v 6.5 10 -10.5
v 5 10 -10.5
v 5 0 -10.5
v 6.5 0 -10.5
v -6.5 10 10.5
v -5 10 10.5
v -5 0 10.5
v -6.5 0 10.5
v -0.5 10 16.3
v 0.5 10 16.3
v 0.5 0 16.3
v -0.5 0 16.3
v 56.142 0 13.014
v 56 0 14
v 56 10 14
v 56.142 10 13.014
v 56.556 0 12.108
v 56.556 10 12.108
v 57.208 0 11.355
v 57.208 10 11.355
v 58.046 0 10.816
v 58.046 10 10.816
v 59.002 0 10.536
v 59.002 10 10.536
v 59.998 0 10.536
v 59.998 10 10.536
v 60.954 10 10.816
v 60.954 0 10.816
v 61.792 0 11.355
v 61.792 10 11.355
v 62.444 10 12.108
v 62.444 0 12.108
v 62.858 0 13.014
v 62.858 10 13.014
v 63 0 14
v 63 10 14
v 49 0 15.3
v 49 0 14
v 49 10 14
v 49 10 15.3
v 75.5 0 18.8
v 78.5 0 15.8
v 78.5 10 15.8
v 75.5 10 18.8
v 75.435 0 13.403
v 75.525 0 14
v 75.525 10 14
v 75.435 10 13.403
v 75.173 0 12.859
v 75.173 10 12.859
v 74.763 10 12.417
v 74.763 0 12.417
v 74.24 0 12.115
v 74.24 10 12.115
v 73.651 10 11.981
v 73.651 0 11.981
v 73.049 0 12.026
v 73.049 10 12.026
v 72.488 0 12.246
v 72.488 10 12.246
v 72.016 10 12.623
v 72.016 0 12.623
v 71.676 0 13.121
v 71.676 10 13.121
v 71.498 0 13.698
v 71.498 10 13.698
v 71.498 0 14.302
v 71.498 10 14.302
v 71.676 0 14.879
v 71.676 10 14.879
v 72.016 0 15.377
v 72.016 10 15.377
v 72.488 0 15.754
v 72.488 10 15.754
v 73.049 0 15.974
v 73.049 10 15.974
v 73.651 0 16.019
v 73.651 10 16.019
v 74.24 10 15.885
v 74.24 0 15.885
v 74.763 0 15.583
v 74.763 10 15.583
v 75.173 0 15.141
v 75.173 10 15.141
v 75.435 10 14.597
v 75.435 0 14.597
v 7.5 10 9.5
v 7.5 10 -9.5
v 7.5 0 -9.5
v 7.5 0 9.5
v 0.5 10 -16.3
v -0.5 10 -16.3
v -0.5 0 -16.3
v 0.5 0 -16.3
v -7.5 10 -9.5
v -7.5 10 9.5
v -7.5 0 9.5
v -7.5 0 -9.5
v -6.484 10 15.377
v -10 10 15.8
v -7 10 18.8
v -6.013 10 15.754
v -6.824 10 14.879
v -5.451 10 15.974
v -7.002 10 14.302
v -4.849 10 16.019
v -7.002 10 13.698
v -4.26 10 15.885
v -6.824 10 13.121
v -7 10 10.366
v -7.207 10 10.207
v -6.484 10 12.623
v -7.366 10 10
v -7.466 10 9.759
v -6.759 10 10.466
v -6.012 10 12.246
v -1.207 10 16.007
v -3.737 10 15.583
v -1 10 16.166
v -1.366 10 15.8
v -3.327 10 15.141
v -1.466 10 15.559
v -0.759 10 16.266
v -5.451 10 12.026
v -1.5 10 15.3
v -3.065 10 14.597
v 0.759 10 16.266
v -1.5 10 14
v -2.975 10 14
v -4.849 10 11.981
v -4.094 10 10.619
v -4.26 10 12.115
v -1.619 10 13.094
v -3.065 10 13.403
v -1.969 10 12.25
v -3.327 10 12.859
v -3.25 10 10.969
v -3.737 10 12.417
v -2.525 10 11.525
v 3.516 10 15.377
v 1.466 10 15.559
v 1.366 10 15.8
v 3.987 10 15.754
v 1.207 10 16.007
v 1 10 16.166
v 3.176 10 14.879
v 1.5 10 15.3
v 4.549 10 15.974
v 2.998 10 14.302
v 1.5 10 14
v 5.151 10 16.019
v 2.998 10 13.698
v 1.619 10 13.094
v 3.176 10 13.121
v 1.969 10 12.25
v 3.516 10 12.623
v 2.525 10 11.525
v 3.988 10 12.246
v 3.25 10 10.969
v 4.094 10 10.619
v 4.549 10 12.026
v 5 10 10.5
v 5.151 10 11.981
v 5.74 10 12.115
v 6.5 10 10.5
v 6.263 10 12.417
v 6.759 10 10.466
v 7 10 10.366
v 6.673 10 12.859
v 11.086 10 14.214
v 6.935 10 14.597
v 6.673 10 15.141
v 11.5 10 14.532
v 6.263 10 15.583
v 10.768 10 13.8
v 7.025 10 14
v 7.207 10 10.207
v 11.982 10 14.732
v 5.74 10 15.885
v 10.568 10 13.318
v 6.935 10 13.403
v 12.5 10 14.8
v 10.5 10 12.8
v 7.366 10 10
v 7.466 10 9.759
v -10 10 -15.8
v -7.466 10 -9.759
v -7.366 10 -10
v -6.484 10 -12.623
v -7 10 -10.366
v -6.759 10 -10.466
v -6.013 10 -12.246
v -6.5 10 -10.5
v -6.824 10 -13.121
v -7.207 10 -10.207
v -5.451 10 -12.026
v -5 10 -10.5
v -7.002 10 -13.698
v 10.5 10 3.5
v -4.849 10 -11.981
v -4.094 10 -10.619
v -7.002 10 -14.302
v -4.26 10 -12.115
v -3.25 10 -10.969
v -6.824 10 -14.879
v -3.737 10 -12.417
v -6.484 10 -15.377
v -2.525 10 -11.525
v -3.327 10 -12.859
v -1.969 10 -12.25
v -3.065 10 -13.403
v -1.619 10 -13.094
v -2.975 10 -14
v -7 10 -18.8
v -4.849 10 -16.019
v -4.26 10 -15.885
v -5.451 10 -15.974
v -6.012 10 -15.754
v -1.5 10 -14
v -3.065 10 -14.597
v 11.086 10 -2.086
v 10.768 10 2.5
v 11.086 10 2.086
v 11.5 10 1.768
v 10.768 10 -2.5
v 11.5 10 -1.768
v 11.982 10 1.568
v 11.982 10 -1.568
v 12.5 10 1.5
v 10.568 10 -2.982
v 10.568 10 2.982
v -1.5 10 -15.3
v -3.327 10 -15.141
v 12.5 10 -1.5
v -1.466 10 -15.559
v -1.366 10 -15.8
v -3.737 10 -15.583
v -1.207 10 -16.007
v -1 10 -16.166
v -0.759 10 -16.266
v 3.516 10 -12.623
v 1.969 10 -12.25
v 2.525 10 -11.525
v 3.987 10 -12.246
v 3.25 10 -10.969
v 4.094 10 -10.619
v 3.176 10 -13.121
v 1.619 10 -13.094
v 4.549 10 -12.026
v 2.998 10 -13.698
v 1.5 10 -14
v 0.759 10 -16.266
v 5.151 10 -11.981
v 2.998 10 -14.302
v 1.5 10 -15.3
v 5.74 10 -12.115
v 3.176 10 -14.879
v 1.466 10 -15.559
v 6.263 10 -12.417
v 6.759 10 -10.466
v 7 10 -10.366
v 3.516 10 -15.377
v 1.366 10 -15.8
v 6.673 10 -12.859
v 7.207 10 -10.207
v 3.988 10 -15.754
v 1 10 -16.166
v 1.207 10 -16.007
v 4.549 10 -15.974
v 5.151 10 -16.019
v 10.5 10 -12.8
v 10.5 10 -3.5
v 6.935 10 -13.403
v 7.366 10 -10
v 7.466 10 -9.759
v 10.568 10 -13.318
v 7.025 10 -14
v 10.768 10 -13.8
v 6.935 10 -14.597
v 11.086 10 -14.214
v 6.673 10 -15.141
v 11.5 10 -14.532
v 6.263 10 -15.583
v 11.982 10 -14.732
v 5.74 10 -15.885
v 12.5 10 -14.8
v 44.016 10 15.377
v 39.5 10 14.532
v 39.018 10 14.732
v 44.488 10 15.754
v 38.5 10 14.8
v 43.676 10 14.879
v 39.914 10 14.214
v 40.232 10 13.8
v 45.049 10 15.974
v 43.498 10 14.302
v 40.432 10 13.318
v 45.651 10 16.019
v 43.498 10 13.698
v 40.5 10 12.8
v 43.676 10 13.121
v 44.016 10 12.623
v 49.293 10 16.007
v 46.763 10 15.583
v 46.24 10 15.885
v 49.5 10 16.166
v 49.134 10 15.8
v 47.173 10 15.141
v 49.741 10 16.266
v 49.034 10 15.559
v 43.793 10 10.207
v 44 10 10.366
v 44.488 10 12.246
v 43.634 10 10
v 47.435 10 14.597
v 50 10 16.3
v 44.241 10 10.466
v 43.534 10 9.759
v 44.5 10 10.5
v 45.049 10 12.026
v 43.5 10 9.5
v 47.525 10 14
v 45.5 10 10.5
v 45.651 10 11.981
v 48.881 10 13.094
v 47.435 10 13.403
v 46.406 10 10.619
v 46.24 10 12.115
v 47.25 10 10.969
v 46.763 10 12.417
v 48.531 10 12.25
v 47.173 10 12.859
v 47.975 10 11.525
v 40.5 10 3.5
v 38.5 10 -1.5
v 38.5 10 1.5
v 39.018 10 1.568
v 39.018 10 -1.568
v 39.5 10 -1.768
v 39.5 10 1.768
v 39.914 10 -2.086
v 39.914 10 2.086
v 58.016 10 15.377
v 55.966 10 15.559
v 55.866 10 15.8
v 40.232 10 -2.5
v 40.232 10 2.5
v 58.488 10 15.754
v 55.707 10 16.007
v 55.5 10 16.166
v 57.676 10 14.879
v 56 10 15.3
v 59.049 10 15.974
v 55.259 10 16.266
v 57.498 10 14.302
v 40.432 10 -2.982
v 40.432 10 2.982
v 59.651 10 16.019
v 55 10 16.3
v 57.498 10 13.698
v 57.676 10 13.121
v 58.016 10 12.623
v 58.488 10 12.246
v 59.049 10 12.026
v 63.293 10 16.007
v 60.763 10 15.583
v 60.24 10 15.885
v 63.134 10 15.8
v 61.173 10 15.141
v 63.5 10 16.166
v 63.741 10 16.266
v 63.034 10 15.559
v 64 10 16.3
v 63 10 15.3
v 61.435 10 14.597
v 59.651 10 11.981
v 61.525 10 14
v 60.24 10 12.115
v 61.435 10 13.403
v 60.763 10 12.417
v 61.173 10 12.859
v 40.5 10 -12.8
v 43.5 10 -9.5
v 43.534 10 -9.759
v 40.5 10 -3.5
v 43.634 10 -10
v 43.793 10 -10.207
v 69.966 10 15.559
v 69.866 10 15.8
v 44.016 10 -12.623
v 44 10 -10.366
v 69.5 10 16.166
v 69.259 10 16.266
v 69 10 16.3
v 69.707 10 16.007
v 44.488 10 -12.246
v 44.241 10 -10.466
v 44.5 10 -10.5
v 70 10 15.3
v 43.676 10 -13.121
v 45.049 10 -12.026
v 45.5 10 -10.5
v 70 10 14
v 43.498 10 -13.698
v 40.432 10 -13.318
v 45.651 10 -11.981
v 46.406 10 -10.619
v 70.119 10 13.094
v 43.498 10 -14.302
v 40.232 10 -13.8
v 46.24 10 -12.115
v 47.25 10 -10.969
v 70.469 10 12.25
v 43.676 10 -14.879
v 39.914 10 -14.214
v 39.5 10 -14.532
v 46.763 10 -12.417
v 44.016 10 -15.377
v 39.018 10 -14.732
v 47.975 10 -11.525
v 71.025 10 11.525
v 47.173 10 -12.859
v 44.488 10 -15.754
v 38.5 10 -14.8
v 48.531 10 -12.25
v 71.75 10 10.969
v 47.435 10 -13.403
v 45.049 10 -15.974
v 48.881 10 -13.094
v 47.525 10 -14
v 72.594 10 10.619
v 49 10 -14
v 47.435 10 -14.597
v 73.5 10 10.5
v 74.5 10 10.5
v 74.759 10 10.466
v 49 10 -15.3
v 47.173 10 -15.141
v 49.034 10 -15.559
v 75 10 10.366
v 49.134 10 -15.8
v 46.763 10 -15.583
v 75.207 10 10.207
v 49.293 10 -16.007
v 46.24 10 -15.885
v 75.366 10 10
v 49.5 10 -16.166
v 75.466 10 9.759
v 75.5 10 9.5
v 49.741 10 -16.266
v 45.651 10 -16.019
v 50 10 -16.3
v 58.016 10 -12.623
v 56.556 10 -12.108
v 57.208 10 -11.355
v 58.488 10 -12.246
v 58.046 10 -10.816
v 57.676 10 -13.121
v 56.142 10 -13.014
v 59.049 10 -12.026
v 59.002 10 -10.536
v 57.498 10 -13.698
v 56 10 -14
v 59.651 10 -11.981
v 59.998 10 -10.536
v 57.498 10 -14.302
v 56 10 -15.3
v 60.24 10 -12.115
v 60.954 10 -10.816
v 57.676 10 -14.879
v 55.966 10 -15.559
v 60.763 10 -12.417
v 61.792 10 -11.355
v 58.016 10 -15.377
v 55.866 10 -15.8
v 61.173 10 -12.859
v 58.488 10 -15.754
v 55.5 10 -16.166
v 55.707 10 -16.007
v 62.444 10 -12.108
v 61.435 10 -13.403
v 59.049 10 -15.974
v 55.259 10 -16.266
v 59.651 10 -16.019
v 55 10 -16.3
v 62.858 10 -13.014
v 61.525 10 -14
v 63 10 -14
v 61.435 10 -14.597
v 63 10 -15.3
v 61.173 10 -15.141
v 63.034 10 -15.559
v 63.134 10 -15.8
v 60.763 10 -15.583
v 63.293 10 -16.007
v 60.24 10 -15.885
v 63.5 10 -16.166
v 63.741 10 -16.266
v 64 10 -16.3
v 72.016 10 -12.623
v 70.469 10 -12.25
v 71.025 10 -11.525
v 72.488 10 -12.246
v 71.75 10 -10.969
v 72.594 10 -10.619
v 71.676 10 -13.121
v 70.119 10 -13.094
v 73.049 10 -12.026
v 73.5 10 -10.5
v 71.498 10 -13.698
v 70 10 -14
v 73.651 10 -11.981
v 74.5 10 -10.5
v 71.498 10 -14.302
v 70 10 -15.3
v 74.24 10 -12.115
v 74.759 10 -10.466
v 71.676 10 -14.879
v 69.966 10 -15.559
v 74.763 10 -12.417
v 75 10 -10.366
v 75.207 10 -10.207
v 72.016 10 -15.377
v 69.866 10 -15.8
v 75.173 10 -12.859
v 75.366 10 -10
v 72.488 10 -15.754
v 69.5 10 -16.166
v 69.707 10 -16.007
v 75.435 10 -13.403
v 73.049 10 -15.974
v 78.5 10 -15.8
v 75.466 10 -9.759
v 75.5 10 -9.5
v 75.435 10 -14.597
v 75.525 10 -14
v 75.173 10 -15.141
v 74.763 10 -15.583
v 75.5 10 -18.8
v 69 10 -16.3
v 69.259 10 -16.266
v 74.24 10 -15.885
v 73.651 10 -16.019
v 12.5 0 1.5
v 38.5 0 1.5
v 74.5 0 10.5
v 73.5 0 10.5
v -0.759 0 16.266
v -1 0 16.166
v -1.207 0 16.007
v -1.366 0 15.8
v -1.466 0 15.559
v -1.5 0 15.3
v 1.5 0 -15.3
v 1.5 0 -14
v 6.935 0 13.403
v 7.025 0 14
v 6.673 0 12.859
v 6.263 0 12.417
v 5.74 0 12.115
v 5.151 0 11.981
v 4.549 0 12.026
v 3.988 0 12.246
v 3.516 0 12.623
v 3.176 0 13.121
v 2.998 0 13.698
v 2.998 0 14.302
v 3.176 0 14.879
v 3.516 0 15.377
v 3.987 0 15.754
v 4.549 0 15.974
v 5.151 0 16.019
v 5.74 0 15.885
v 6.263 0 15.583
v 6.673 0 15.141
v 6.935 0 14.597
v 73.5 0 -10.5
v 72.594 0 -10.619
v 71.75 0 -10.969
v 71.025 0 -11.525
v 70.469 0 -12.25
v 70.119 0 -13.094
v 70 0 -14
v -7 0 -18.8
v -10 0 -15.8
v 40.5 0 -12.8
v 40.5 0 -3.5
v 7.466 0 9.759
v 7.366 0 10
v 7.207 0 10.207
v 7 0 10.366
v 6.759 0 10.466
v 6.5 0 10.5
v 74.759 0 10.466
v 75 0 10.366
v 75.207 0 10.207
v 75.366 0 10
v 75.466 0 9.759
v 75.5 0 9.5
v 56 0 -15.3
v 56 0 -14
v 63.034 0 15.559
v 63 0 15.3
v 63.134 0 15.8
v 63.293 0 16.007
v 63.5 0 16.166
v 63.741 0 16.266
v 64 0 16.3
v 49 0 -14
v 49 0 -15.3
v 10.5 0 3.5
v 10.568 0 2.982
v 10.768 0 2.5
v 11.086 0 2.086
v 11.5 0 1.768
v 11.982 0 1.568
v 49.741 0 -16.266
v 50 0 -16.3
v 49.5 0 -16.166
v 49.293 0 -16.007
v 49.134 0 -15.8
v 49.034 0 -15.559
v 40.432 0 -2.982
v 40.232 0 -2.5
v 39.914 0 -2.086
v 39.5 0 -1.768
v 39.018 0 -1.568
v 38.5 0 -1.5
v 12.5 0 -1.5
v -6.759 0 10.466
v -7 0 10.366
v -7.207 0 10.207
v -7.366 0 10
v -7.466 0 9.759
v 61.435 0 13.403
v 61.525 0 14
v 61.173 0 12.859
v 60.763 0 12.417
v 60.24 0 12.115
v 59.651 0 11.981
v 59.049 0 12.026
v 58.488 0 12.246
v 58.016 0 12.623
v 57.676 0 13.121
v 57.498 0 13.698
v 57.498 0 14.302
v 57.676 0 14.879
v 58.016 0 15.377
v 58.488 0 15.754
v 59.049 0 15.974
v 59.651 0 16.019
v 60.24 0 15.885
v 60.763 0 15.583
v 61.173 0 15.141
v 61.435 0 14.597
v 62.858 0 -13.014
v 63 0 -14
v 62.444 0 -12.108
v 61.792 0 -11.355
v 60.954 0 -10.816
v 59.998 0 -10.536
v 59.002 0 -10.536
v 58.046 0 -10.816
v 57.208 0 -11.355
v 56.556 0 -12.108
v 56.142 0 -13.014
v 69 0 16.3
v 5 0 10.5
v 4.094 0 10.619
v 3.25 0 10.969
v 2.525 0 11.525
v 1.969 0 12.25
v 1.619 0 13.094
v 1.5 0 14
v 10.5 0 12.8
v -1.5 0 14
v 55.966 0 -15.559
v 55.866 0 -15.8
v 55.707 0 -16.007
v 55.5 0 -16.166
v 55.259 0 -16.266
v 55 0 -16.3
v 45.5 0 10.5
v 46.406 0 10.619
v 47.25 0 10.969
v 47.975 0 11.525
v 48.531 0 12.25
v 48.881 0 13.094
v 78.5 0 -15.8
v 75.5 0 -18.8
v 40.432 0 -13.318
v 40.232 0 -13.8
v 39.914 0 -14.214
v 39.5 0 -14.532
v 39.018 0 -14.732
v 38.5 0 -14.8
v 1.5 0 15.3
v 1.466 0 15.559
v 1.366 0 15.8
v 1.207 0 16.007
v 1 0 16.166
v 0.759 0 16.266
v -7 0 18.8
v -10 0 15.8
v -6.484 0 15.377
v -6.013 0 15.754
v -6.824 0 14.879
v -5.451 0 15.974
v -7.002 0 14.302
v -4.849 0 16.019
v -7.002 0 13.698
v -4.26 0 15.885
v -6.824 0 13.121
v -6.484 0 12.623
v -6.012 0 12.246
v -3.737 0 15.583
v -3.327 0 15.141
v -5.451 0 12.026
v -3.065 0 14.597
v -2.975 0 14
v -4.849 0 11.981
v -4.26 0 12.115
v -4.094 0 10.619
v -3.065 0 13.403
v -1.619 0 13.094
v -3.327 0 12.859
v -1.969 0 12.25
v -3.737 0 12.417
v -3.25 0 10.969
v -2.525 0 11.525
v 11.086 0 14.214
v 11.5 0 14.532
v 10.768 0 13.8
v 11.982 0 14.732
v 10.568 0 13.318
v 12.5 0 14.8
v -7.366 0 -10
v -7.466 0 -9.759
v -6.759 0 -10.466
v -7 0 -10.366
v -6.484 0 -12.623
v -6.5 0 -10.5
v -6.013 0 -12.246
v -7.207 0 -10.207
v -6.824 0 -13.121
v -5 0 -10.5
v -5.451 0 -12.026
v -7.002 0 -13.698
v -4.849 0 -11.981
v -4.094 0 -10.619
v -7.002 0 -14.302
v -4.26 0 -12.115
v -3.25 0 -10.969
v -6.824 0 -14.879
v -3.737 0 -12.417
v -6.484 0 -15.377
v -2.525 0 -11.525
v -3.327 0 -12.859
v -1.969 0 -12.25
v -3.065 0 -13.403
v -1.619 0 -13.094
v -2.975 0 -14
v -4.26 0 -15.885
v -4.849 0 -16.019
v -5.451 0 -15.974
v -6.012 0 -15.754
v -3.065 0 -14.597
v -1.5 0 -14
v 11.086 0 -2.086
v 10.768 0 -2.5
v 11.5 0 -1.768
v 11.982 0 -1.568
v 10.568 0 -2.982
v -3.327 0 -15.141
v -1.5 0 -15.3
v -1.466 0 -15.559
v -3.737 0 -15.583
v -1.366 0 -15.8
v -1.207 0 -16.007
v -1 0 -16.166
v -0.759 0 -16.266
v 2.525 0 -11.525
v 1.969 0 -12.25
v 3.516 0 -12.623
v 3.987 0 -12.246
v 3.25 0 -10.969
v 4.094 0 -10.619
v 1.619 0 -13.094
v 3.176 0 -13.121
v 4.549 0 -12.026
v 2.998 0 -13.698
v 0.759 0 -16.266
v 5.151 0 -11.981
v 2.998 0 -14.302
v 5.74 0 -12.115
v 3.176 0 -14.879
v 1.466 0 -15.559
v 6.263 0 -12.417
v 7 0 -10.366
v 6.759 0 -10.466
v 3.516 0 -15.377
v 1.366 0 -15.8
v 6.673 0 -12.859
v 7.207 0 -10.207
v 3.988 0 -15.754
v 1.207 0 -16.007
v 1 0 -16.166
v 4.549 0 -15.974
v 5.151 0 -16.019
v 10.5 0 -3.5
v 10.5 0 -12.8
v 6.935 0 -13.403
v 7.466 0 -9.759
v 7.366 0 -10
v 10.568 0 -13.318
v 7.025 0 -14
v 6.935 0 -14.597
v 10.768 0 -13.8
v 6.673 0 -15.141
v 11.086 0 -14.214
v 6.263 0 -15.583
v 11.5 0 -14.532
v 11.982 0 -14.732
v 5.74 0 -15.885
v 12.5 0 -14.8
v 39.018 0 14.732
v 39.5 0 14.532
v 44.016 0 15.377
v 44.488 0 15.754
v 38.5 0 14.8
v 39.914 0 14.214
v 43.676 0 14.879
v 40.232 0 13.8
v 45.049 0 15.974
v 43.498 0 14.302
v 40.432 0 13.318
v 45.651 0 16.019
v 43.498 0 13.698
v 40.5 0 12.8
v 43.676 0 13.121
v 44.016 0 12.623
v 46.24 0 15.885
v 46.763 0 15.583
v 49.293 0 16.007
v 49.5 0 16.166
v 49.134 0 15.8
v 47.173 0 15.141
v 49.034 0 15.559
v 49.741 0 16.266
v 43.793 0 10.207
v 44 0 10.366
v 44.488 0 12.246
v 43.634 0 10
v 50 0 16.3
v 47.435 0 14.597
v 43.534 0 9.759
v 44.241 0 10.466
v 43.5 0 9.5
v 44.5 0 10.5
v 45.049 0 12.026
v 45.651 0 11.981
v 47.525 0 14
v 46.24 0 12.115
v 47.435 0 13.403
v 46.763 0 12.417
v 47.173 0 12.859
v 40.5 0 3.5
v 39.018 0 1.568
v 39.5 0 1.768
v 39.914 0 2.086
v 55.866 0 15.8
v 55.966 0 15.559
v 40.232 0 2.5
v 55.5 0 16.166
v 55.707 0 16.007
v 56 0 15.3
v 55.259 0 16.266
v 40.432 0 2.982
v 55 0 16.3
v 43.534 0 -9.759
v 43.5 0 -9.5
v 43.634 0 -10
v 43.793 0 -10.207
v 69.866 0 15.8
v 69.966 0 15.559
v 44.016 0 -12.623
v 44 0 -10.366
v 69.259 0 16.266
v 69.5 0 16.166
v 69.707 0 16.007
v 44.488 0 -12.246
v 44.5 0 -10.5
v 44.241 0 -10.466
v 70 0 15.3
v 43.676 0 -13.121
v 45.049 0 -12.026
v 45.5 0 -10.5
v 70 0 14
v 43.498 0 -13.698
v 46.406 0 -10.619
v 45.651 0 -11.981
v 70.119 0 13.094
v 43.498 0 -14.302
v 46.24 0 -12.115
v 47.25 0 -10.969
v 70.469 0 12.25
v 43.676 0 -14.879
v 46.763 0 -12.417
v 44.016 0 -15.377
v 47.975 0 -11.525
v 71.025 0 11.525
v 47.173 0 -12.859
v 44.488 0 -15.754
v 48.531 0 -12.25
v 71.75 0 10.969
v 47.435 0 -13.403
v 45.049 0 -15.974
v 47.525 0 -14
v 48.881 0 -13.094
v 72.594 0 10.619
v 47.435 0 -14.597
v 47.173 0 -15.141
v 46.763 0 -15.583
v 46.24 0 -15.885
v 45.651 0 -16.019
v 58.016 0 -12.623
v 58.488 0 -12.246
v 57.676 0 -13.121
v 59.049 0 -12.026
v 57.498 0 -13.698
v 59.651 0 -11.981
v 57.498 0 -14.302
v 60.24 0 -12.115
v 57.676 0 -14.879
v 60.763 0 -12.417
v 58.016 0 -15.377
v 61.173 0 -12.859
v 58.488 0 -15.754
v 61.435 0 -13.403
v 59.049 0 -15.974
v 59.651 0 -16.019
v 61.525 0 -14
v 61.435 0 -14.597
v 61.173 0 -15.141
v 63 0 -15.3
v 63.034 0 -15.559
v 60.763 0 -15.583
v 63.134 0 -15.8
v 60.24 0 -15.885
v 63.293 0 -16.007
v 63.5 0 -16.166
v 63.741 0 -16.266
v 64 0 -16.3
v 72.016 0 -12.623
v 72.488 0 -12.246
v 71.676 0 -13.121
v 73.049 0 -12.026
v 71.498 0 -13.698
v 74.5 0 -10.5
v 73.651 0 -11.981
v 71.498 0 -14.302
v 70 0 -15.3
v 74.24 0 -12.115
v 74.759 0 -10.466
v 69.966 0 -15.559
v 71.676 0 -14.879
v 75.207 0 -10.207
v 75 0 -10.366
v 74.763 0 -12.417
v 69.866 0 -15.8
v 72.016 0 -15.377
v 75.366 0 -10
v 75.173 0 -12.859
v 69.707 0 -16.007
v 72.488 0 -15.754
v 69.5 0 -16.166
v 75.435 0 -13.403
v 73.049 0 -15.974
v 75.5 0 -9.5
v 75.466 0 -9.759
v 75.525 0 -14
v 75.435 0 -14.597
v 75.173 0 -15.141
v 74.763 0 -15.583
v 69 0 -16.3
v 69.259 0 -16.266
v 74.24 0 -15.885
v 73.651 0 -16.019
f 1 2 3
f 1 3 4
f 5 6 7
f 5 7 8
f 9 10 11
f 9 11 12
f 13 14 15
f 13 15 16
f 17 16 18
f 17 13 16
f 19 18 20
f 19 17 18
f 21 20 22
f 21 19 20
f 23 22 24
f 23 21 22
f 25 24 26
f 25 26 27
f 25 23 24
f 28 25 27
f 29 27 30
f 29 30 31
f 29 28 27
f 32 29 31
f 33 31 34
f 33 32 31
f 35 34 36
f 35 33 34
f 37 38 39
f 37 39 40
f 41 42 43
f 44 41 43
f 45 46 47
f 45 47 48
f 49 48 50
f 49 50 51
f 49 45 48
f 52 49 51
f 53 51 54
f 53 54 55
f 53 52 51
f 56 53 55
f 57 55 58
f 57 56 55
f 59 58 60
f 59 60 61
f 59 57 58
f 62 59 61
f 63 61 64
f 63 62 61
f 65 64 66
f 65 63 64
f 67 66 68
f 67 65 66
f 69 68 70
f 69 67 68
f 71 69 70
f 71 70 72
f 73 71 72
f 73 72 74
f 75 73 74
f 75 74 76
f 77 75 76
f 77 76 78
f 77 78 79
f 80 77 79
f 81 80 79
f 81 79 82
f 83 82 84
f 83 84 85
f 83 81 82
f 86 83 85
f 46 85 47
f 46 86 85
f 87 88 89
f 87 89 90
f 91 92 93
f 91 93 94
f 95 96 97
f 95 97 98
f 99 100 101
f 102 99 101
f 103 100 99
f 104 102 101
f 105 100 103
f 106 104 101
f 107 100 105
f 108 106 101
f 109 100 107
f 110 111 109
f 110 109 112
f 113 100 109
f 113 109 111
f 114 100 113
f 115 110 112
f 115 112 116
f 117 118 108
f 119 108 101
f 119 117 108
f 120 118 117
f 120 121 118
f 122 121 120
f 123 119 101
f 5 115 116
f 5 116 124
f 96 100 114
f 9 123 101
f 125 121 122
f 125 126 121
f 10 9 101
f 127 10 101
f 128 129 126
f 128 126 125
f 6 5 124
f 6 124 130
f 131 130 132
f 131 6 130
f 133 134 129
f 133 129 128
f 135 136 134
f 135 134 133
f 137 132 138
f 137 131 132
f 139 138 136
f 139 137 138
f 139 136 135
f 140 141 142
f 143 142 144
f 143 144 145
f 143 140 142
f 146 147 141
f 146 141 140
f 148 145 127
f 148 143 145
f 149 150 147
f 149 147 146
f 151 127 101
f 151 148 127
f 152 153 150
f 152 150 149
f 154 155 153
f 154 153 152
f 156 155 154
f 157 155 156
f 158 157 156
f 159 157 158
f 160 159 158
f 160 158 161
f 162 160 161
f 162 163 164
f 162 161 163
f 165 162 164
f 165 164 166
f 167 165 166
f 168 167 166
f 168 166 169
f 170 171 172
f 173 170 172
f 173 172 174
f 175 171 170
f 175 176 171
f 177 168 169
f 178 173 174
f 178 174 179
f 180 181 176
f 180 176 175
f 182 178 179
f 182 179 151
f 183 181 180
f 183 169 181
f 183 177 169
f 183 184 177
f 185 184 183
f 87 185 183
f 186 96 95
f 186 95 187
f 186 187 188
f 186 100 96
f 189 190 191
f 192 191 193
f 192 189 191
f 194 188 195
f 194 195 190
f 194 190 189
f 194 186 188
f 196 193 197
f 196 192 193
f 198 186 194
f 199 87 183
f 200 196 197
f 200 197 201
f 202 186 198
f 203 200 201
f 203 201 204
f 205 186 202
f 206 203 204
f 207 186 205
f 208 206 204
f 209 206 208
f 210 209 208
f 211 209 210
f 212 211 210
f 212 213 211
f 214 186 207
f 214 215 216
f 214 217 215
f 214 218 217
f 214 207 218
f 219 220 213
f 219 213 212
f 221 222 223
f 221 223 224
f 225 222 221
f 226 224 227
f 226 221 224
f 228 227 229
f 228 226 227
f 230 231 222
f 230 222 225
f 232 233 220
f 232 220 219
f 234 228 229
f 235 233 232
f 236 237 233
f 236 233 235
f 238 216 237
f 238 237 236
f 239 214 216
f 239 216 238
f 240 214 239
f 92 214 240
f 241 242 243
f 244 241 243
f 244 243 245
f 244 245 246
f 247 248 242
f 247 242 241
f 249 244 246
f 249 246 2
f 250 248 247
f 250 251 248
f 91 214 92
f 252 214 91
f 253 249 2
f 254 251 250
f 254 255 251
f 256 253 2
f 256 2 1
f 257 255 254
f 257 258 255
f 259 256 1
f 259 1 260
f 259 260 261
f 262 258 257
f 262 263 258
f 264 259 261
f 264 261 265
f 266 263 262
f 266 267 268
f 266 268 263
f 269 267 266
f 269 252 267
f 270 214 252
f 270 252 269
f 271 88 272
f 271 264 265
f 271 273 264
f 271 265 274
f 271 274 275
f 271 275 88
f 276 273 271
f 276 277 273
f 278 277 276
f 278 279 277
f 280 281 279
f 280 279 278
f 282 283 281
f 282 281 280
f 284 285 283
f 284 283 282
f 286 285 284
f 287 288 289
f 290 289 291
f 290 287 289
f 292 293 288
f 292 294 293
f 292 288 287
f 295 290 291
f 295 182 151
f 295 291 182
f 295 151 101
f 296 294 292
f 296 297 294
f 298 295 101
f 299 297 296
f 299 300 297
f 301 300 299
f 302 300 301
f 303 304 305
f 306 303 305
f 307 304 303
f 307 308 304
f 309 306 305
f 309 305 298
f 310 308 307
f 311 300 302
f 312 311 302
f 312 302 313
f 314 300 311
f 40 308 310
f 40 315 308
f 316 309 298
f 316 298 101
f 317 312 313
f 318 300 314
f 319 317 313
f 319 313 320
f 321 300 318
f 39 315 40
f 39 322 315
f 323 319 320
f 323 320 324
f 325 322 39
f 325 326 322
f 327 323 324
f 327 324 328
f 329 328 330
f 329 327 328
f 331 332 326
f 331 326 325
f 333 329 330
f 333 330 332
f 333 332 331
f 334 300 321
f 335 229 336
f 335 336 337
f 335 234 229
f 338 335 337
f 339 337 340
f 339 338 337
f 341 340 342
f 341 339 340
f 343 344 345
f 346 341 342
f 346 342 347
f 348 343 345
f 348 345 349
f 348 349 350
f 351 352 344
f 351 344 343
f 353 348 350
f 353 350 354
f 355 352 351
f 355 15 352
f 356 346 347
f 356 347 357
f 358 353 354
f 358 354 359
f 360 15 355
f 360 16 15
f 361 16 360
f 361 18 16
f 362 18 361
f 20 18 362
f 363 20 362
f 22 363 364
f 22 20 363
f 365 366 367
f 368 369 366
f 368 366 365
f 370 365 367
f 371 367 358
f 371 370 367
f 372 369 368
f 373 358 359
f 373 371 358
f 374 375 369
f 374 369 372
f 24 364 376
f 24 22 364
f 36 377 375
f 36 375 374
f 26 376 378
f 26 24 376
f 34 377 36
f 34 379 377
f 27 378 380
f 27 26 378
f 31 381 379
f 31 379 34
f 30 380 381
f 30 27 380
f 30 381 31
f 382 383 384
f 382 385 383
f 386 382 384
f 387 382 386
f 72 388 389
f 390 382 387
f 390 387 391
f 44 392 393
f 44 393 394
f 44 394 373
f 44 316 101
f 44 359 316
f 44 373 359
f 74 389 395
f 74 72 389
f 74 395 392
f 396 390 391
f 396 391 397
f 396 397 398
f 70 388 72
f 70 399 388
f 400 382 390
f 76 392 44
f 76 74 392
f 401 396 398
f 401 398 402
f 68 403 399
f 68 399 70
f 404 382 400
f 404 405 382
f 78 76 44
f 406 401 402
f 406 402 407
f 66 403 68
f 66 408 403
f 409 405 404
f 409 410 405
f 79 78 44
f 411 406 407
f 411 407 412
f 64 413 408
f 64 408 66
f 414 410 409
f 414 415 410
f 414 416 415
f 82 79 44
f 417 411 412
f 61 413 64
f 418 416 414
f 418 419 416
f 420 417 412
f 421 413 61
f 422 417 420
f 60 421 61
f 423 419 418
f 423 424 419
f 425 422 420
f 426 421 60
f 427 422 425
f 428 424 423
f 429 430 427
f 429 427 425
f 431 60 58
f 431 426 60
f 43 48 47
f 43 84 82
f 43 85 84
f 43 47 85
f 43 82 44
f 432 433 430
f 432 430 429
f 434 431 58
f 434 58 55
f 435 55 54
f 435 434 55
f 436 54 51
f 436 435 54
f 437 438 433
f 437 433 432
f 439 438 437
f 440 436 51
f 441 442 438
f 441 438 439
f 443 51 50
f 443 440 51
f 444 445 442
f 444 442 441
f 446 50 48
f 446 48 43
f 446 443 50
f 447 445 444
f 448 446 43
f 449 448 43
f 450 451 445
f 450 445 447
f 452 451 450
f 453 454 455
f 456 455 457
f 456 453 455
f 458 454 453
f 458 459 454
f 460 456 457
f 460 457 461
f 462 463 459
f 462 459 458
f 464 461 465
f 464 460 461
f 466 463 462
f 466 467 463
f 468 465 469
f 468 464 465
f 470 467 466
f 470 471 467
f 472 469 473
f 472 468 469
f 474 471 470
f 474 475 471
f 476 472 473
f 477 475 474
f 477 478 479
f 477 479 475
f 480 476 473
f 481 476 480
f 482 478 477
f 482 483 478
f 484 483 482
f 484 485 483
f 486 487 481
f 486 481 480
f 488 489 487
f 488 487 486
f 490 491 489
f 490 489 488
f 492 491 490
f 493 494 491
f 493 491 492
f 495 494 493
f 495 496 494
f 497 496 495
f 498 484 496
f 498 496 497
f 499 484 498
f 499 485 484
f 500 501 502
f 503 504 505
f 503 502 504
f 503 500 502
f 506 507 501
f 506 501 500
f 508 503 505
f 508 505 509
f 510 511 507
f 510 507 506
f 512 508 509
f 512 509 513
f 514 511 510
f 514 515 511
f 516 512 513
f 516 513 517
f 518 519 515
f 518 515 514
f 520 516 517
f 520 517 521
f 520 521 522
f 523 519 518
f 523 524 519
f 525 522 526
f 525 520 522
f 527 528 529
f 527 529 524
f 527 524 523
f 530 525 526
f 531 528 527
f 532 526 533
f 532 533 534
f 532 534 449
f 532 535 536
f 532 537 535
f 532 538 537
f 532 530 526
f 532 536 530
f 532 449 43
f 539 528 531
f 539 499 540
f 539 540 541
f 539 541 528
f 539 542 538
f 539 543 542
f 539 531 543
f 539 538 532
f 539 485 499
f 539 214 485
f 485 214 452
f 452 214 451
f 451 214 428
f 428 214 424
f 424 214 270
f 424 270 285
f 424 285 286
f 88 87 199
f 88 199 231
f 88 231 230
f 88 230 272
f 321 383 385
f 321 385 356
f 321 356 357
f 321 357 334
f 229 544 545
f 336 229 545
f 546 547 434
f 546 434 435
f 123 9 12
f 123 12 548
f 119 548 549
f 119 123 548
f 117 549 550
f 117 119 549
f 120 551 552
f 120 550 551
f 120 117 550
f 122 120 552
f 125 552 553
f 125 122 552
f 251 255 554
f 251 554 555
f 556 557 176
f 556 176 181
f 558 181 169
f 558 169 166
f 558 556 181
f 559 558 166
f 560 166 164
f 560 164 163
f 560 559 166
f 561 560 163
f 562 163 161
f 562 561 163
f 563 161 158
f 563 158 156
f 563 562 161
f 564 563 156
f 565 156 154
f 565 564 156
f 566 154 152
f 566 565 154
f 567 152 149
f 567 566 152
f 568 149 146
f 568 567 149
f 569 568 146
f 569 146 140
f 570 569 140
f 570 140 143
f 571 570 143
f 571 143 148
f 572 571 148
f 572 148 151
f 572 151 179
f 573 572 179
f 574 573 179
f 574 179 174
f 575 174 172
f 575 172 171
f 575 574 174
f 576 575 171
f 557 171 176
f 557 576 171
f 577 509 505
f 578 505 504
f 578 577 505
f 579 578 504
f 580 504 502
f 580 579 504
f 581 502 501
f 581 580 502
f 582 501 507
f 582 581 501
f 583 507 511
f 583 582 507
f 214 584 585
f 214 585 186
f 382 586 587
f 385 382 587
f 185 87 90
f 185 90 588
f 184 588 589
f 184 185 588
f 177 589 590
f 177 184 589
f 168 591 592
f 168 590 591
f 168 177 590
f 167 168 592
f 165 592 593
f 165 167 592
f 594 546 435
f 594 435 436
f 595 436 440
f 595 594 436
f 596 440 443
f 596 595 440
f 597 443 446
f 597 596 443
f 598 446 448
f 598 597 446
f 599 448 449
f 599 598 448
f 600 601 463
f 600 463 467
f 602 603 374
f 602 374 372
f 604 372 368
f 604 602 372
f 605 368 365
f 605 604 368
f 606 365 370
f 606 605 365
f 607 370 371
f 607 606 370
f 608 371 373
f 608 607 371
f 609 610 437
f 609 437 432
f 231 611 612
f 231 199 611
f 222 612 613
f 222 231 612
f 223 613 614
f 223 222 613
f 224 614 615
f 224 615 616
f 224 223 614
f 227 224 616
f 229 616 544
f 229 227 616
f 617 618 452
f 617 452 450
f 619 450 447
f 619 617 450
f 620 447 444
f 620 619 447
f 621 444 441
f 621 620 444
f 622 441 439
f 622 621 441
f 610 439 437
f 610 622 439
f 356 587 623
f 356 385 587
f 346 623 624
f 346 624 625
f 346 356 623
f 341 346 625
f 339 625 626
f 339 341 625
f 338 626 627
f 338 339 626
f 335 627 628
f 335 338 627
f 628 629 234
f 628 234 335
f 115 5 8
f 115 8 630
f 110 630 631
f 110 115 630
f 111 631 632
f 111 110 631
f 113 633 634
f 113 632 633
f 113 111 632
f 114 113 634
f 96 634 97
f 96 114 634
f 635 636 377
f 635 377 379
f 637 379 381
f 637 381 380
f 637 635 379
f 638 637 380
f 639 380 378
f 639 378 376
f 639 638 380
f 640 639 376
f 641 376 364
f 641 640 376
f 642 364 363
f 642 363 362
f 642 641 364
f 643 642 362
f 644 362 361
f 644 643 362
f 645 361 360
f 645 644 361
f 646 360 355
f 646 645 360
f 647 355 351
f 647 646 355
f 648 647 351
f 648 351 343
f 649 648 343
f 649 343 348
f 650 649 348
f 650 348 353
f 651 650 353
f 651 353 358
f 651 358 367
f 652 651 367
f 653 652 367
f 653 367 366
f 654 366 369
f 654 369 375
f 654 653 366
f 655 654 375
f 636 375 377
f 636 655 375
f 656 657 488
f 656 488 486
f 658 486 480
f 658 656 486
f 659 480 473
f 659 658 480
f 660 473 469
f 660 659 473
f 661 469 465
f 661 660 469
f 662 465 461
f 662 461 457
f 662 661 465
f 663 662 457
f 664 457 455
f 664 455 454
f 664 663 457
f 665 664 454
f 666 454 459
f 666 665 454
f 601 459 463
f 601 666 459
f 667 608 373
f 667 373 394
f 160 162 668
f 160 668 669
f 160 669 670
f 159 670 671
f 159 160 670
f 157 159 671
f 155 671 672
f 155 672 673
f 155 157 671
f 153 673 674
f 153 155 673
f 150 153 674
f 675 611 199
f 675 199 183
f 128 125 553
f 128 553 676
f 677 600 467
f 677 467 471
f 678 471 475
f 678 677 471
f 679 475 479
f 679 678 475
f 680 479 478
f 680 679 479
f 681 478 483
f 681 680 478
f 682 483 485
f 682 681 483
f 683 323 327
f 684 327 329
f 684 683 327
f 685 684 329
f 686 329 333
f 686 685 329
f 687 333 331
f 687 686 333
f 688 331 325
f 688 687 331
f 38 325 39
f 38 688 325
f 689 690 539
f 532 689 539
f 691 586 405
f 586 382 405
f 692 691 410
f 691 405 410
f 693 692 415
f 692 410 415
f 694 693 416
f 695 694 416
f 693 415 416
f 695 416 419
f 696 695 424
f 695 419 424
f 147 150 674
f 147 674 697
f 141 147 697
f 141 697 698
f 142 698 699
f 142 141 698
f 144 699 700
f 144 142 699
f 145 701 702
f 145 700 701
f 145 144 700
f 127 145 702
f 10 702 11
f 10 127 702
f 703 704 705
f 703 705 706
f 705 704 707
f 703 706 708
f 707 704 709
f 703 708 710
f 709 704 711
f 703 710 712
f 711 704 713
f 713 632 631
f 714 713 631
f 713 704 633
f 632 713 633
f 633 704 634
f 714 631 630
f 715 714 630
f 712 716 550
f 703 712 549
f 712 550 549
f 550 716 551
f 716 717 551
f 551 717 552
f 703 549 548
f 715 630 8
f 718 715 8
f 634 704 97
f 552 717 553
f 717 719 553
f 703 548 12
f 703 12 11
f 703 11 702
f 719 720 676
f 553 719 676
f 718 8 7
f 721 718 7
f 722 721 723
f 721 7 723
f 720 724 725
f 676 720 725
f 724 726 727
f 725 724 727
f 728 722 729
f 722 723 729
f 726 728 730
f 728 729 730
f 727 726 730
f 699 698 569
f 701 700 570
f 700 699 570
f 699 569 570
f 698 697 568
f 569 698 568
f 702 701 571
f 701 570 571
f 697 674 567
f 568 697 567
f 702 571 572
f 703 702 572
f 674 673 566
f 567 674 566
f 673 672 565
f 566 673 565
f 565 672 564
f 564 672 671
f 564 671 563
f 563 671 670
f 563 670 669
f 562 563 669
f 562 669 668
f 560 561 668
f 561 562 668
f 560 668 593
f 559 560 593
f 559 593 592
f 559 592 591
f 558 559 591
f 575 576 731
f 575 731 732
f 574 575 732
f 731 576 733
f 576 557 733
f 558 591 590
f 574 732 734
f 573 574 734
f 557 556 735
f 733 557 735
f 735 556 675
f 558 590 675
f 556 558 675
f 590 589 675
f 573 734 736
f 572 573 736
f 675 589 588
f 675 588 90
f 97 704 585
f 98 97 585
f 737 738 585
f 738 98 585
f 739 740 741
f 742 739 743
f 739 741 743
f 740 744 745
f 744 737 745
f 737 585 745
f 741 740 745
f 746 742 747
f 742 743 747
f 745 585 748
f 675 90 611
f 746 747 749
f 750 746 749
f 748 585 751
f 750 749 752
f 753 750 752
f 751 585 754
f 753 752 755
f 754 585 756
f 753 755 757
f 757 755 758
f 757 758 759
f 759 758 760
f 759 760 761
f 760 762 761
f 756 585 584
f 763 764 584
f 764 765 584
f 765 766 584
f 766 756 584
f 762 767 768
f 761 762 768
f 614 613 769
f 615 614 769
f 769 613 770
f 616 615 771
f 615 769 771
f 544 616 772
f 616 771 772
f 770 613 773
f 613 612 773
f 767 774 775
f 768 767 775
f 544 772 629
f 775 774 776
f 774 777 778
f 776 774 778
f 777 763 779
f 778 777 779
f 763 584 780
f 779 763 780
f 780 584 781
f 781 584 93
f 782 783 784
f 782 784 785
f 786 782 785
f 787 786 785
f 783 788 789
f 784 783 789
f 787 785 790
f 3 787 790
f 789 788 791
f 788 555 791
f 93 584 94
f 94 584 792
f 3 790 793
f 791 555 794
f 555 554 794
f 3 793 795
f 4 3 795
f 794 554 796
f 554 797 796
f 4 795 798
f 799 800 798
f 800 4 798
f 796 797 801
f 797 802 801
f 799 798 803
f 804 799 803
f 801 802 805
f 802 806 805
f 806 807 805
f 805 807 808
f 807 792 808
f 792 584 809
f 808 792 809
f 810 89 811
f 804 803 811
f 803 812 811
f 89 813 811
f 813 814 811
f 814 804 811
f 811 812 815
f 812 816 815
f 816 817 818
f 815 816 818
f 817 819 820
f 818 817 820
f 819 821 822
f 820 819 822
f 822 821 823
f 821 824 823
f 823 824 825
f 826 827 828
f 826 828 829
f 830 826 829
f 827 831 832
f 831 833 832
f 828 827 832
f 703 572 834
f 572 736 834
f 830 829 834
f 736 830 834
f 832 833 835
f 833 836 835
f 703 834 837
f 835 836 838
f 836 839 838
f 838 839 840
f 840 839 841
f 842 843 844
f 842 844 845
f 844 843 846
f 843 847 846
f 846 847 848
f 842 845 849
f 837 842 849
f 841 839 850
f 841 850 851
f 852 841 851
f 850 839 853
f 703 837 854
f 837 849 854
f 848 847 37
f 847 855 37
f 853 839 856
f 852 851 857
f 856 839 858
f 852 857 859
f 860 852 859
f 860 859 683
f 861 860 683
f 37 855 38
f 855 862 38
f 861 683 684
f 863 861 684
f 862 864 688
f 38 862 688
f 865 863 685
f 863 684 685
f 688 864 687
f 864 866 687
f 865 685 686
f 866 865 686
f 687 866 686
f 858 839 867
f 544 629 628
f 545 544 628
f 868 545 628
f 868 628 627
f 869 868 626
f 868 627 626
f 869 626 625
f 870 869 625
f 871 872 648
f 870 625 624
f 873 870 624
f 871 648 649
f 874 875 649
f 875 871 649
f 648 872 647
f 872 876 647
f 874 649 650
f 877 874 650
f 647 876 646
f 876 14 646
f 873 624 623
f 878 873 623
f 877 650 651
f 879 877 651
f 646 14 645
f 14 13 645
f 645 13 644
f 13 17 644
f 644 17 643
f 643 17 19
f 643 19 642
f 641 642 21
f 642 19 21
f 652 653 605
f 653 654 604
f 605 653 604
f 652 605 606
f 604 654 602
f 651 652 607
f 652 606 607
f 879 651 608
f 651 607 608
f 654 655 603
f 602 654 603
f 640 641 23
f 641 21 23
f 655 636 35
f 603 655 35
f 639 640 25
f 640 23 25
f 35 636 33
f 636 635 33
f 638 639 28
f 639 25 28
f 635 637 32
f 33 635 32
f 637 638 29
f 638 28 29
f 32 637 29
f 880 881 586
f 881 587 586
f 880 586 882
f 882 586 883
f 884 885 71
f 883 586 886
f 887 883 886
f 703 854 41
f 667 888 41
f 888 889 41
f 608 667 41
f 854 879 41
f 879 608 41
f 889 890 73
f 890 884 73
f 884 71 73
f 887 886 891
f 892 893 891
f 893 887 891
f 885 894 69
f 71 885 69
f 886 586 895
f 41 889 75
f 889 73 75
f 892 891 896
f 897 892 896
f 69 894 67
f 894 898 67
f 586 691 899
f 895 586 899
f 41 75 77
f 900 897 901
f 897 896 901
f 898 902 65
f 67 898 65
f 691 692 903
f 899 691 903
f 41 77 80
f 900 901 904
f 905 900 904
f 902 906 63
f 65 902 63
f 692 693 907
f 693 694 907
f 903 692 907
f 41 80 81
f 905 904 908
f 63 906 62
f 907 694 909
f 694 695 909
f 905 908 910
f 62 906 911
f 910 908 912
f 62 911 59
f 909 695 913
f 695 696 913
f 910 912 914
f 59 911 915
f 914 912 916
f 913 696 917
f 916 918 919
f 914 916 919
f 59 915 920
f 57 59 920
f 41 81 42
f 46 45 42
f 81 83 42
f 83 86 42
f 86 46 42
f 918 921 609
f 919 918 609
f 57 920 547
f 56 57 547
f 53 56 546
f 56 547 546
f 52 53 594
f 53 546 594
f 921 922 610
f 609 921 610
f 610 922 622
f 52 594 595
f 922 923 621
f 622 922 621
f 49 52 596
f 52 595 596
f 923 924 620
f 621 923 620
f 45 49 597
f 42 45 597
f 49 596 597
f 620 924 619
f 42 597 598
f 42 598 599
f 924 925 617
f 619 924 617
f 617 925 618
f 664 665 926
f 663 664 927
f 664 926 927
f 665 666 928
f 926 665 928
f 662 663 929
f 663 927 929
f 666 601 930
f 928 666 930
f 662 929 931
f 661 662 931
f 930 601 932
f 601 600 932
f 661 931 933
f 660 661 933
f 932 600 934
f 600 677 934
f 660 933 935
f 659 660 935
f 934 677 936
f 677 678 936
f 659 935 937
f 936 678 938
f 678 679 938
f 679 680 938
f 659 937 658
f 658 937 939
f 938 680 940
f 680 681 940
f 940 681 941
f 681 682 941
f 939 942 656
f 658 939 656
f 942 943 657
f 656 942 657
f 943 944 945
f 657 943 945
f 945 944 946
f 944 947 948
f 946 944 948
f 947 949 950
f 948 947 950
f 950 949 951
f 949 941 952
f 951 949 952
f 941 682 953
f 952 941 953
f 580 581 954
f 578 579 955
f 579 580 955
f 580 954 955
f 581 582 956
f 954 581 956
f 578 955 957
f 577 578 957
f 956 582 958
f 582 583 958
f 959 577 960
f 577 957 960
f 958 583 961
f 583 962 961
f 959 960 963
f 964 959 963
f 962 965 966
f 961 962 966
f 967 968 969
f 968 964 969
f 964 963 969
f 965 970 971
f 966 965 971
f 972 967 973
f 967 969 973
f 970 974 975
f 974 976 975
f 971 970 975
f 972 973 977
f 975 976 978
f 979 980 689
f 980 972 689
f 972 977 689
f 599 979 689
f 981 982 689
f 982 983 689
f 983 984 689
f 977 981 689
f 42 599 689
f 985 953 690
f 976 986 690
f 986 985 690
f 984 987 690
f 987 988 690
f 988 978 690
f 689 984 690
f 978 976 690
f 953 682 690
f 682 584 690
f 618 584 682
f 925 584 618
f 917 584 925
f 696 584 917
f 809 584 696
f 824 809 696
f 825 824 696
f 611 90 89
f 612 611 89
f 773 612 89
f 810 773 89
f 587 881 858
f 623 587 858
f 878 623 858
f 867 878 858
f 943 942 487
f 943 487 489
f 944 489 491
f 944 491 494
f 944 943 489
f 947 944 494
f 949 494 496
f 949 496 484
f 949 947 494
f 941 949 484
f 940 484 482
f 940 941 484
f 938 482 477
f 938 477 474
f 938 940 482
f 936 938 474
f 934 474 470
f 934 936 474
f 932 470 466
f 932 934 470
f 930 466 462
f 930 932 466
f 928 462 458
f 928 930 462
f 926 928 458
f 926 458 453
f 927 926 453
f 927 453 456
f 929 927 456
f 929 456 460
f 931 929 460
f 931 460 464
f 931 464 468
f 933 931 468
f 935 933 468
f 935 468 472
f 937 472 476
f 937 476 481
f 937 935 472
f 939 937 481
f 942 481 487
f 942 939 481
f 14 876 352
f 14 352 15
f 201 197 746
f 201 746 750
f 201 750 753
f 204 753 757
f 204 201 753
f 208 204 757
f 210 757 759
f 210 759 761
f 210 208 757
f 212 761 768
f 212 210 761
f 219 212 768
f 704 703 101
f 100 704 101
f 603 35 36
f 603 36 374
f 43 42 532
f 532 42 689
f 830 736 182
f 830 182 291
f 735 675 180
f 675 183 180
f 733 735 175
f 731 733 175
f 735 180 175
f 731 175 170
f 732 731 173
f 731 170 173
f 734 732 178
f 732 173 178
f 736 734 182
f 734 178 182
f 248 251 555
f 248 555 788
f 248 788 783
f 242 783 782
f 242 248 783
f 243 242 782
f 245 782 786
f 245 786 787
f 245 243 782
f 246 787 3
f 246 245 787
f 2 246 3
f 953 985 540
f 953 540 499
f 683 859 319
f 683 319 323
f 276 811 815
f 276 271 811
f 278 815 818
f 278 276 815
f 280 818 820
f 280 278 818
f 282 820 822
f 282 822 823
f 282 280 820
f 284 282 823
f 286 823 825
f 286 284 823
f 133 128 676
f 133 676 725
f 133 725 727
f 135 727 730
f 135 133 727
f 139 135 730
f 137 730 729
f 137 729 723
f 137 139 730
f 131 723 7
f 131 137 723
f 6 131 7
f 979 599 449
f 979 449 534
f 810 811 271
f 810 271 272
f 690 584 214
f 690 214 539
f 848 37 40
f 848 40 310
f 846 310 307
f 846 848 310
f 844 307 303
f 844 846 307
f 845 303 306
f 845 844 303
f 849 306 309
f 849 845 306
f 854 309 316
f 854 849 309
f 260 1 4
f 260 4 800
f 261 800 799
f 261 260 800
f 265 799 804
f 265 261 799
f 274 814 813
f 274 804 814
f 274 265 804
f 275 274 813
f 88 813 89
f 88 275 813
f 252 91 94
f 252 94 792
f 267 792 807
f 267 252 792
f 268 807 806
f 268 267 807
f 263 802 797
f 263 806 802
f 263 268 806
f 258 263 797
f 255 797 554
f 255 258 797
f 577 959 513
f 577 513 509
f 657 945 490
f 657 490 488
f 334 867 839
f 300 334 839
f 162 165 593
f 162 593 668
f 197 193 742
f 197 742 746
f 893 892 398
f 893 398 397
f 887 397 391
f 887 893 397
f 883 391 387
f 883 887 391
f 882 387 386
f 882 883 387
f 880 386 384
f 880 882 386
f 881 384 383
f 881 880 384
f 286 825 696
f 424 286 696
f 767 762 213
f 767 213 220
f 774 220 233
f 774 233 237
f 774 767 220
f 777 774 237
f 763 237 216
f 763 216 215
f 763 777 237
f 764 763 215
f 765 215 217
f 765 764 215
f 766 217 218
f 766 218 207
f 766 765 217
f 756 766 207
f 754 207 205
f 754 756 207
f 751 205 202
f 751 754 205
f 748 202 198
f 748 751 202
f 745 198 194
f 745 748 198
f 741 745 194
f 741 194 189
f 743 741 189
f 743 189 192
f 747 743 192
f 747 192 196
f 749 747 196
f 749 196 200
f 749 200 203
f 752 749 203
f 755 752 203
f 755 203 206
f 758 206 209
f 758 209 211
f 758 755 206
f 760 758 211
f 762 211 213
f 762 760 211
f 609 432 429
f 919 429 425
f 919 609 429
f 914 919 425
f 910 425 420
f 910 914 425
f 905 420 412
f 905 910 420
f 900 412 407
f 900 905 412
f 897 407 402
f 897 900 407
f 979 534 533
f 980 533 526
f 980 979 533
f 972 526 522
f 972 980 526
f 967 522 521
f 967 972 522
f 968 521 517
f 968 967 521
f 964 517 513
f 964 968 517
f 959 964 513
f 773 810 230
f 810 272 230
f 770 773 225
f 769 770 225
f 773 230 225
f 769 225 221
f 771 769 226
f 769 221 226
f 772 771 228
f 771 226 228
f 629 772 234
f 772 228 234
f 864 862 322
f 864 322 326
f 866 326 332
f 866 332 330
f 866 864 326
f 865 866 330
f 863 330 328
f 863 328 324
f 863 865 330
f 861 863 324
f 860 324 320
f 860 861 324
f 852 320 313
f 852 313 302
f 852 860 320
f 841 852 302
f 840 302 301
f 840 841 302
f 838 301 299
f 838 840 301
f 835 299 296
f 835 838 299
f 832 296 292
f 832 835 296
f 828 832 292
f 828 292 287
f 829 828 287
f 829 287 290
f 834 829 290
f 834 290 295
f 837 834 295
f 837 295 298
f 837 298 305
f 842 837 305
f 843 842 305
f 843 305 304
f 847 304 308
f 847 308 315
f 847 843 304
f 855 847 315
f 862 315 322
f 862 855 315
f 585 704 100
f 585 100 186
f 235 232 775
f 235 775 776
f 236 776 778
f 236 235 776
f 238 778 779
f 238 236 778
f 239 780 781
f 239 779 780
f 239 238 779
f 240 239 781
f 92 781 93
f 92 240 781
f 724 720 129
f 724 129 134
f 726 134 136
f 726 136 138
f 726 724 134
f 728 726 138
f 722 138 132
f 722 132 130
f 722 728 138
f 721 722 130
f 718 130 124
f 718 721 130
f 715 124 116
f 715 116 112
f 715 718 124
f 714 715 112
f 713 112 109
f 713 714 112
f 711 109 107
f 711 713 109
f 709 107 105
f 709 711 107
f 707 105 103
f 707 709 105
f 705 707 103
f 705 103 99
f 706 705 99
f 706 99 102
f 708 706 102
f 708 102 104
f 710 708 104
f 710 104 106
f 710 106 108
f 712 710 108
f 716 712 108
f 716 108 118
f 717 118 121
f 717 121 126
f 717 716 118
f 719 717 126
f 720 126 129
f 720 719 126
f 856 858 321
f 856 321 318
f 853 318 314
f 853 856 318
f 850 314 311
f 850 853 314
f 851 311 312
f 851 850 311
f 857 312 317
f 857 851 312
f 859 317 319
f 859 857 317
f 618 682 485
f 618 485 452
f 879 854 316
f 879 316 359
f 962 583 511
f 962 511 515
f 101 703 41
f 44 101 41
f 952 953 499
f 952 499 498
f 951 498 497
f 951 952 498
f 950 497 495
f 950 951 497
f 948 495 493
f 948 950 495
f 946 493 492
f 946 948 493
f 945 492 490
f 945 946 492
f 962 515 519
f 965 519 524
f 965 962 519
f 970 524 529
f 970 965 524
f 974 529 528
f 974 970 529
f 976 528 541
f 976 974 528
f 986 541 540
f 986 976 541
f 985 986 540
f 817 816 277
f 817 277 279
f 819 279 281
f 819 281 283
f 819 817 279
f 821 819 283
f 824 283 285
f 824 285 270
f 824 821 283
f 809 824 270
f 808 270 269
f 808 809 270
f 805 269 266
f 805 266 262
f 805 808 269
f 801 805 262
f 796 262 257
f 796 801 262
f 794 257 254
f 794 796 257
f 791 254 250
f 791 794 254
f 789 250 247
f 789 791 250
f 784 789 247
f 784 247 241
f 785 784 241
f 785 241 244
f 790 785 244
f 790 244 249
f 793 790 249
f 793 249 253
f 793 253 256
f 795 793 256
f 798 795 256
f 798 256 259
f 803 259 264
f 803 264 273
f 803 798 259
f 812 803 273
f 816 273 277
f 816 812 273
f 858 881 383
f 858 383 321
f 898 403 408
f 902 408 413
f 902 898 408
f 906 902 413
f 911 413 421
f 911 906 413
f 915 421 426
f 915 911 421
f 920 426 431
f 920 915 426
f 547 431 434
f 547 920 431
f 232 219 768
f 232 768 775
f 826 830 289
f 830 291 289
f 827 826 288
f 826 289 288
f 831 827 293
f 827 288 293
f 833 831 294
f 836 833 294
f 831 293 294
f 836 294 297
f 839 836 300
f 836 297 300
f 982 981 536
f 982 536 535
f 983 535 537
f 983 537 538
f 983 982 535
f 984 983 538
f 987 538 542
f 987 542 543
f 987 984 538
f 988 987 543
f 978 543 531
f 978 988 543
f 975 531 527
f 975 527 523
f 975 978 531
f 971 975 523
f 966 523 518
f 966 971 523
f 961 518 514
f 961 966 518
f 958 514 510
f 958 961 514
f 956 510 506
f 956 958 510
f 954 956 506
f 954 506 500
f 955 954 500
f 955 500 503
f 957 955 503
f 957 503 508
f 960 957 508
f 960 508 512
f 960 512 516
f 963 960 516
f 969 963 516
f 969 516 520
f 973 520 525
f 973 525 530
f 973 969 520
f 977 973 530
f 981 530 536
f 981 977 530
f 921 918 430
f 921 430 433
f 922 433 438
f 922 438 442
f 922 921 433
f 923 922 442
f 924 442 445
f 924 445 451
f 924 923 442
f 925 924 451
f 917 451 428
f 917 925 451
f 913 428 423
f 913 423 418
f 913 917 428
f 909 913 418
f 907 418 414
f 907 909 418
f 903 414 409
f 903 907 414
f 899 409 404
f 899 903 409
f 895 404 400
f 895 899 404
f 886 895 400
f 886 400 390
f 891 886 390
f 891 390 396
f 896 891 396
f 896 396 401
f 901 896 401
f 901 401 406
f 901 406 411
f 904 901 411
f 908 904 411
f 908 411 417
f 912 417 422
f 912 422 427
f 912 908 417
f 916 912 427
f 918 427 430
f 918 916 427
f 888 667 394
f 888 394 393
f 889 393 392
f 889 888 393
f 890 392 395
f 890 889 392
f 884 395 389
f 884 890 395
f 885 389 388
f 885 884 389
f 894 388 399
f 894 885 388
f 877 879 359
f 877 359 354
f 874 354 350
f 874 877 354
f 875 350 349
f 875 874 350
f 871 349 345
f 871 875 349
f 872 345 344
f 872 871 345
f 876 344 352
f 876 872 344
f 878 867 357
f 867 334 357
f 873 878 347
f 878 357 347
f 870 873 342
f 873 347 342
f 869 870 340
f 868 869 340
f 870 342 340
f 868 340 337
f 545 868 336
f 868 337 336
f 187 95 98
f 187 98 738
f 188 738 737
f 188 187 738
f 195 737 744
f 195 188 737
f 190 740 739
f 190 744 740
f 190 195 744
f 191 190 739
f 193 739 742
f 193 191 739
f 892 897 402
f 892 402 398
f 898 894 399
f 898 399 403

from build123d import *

# Parameters (mm, degrees)
SKETCH_1_W          = 88.5
SKETCH_1_H          = 37.6
SKETCH_1_R          = 2.025
EXTRUDE_1_DEPTH     = 10
CUT_EXTRUDE_1_DEPTH = 11
CUT_EXTRUDE_2_DEPTH = 11
SKETCH_4_W          = 30
SKETCH_4_H          = 29.6
CUT_EXTRUDE_3_DEPTH = 11
SKETCH_5_W          = 30
SKETCH_5_H          = 3
EXTRUDE_2_DEPTH     = 10
FILLET_1_R          = 2
CHAMFER_1_SIZE      = 3


with BuildPart() as part:
    # 草图1 → 凸台-拉伸1 (new body)
    with BuildSketch(Plane(origin=(0, 0, 0), x_dir=(1, 0, 0), z_dir=(0, 1, 0))):
        with Locations((34.25, 0)):
            Rectangle(SKETCH_1_W, SKETCH_1_H)
        with Locations((-5, 14)):
            Circle(SKETCH_1_R, mode=Mode.SUBTRACT)
        with Locations((5, 14)):
            Circle(SKETCH_1_R, mode=Mode.SUBTRACT)
        with Locations((5, -14)):
            Circle(SKETCH_1_R, mode=Mode.SUBTRACT)
        with Locations((-5, -14)):
            Circle(SKETCH_1_R, mode=Mode.SUBTRACT)
        with Locations((45.5, 14)):
            Circle(SKETCH_1_R, mode=Mode.SUBTRACT)
        with Locations((59.5, 14)):
            Circle(SKETCH_1_R, mode=Mode.SUBTRACT)
        with Locations((73.5, 14)):
            Circle(SKETCH_1_R, mode=Mode.SUBTRACT)
        with Locations((73.5, -14)):
            Circle(SKETCH_1_R, mode=Mode.SUBTRACT)
        with Locations((59.5, -14)):
            Circle(SKETCH_1_R, mode=Mode.SUBTRACT)
        with Locations((45.5, -14)):
            Circle(SKETCH_1_R, mode=Mode.SUBTRACT)
    extrude(amount=EXTRUDE_1_DEPTH)

    # 草图2 → 切除-拉伸1 (cut, through all)
    with BuildSketch(Plane(origin=(0, 10, 0), x_dir=(1, 0, 0), z_dir=(0, 1, 0))):
        with BuildLine():
            Line((-7.5, -9.5), (-7.5, 9.5))
            ThreePointArc((-7.5, 9.5), (-7.207106781, 10.207106781), (-6.5, 10.5))
            Line((-6.5, 10.5), (-5, 10.5))
            ThreePointArc((-5, 10.5), (-2.525126266, 11.525126266), (-1.5, 14))
            Line((-1.5, 14), (-1.5, 15.3))
            ThreePointArc((-1.5, 15.3), (-1.207106781, 16.007106781), (-0.5, 16.3))
            Line((-0.5, 16.3), (0.5, 16.3))
            ThreePointArc((0.5, 16.3), (1.207106781, 16.007106781), (1.5, 15.3))
            Line((1.5, 15.3), (1.5, 14))
            ThreePointArc((1.5, 14), (2.525126266, 11.525126266), (5, 10.5))
            Line((5, 10.5), (6.5, 10.5))
            ThreePointArc((6.5, 10.5), (7.207106781, 10.207106781), (7.5, 9.5))
            Line((7.5, 9.5), (7.5, -9.5))
            ThreePointArc((7.5, -9.5), (7.207106781, -10.207106781), (6.5, -10.5))
            Line((6.5, -10.5), (5, -10.5))
            ThreePointArc((5, -10.5), (2.525126266, -11.525126266), (1.5, -14))
            Line((1.5, -14), (1.5, -15.3))
            ThreePointArc((1.5, -15.3), (1.207106781, -16.007106781), (0.5, -16.3))
            Line((0.5, -16.3), (-0.5, -16.3))
            ThreePointArc((-0.5, -16.3), (-1.207106781, -16.007106781), (-1.5, -15.3))
            Line((-1.5, -15.3), (-1.5, -14))
            ThreePointArc((-1.5, -14), (-2.525126266, -11.525126266), (-5, -10.5))
            Line((-5, -10.5), (-6.5, -10.5))
            ThreePointArc((-6.5, -10.5), (-7.207106781, -10.207106781), (-7.5, -9.5))
        make_face()
    extrude(amount=-CUT_EXTRUDE_1_DEPTH, mode=Mode.SUBTRACT)

    # 草图3 → 切除-拉伸2 (cut, through all)
    with BuildSketch(Plane.XZ):
        with BuildLine():
            Line((43.5, -9.5), (43.5, 9.5))
            ThreePointArc((43.5, 9.5), (43.792893219, 10.207106781), (44.5, 10.5))
            Line((44.5, 10.5), (45.5, 10.5))
            ThreePointArc((45.5, 10.5), (47.974873734, 11.525126266), (49, 14))
            Line((49, 14), (49, 15.3))
            ThreePointArc((49, 15.3), (49.292893219, 16.007106781), (50, 16.3))
            Line((50, 16.3), (55, 16.3))
            ThreePointArc((55, 16.3), (55.707106781, 16.007106781), (56, 15.3))
            Line((56, 15.3), (56, 14))
            ThreePointArc((56, 14), (59.5, 10.5), (63, 14))
            Line((63, 14), (63, 15.3))
            ThreePointArc((63, 15.3), (63.292893219, 16.007106781), (64, 16.3))
            Line((64, 16.3), (69, 16.3))
            ThreePointArc((69, 16.3), (69.707106781, 16.007106781), (70, 15.3))
            Line((70, 15.3), (70, 14))
            ThreePointArc((70, 14), (71.025126266, 11.525126266), (73.5, 10.5))
            Line((73.5, 10.5), (74.5, 10.5))
            ThreePointArc((74.5, 10.5), (75.207106781, 10.207106781), (75.5, 9.5))
            Line((75.5, 9.5), (75.5, -9.5))
            ThreePointArc((75.5, -9.5), (75.207106781, -10.207106781), (74.5, -10.5))
            Line((74.5, -10.5), (73.5, -10.5))
            ThreePointArc((73.5, -10.5), (71.025126266, -11.525126266), (70, -14))
            Line((70, -14), (70, -15.3))
            ThreePointArc((70, -15.3), (69.707106781, -16.007106781), (69, -16.3))
            Line((69, -16.3), (64, -16.3))
            ThreePointArc((64, -16.3), (63.292893219, -16.007106781), (63, -15.3))
            Line((63, -15.3), (63, -14))
            ThreePointArc((63, -14), (59.5, -10.5), (56, -14))
            Line((56, -14), (56, -15.3))
            ThreePointArc((56, -15.3), (55.707106781, -16.007106781), (55, -16.3))
            Line((55, -16.3), (50, -16.3))
            ThreePointArc((50, -16.3), (49.292893219, -16.007106781), (49, -15.3))
            Line((49, -15.3), (49, -14))
            ThreePointArc((49, -14), (47.974873734, -11.525126266), (45.5, -10.5))
            Line((45.5, -10.5), (44.5, -10.5))
            ThreePointArc((44.5, -10.5), (43.792893219, -10.207106781), (43.5, -9.5))
        make_face()
    extrude(amount=-CUT_EXTRUDE_2_DEPTH, mode=Mode.SUBTRACT)

    # 草图4 → 切除-拉伸3 (cut, through all)
    with BuildSketch(Plane.XZ):
        with Locations((25.5, 0)):
            Rectangle(SKETCH_4_W, SKETCH_4_H)
    extrude(amount=-CUT_EXTRUDE_3_DEPTH, mode=Mode.SUBTRACT)

    # 草图5 → 凸台-拉伸2 (add)
    with BuildSketch(Plane.XZ):
        with Locations((25.5, 0)):
            Rectangle(SKETCH_5_W, SKETCH_5_H)
    extrude(amount=-EXTRUDE_2_DEPTH)

    # 圆角1
    fillet_1_edges = [part.edges().sort_by_distance(p)[0] for p in [
        (40.5, 5, 14.8),
        (40.5, 5, -14.8),
        (10.5, 5, -14.8),
        (10.5, 5, 14.8),
        (40.5, 5, -1.5),
        (40.5, 5, 1.5),
        (10.5, 5, 1.5),
        (10.5, 5, -1.5),
    ]]
    fillet(fillet_1_edges, radius=FILLET_1_R)

    # 倒角1
    chamfer_1_edges = [part.edges().sort_by_distance(p)[0] for p in [
        (-10, 5, -18.8),
        (78.5, 5, -18.8),
        (78.5, 5, 18.8),
        (-10, 5, 18.8),
    ]]
    chamfer(chamfer_1_edges, length=CHAMFER_1_SIZE)


solid = part.part
